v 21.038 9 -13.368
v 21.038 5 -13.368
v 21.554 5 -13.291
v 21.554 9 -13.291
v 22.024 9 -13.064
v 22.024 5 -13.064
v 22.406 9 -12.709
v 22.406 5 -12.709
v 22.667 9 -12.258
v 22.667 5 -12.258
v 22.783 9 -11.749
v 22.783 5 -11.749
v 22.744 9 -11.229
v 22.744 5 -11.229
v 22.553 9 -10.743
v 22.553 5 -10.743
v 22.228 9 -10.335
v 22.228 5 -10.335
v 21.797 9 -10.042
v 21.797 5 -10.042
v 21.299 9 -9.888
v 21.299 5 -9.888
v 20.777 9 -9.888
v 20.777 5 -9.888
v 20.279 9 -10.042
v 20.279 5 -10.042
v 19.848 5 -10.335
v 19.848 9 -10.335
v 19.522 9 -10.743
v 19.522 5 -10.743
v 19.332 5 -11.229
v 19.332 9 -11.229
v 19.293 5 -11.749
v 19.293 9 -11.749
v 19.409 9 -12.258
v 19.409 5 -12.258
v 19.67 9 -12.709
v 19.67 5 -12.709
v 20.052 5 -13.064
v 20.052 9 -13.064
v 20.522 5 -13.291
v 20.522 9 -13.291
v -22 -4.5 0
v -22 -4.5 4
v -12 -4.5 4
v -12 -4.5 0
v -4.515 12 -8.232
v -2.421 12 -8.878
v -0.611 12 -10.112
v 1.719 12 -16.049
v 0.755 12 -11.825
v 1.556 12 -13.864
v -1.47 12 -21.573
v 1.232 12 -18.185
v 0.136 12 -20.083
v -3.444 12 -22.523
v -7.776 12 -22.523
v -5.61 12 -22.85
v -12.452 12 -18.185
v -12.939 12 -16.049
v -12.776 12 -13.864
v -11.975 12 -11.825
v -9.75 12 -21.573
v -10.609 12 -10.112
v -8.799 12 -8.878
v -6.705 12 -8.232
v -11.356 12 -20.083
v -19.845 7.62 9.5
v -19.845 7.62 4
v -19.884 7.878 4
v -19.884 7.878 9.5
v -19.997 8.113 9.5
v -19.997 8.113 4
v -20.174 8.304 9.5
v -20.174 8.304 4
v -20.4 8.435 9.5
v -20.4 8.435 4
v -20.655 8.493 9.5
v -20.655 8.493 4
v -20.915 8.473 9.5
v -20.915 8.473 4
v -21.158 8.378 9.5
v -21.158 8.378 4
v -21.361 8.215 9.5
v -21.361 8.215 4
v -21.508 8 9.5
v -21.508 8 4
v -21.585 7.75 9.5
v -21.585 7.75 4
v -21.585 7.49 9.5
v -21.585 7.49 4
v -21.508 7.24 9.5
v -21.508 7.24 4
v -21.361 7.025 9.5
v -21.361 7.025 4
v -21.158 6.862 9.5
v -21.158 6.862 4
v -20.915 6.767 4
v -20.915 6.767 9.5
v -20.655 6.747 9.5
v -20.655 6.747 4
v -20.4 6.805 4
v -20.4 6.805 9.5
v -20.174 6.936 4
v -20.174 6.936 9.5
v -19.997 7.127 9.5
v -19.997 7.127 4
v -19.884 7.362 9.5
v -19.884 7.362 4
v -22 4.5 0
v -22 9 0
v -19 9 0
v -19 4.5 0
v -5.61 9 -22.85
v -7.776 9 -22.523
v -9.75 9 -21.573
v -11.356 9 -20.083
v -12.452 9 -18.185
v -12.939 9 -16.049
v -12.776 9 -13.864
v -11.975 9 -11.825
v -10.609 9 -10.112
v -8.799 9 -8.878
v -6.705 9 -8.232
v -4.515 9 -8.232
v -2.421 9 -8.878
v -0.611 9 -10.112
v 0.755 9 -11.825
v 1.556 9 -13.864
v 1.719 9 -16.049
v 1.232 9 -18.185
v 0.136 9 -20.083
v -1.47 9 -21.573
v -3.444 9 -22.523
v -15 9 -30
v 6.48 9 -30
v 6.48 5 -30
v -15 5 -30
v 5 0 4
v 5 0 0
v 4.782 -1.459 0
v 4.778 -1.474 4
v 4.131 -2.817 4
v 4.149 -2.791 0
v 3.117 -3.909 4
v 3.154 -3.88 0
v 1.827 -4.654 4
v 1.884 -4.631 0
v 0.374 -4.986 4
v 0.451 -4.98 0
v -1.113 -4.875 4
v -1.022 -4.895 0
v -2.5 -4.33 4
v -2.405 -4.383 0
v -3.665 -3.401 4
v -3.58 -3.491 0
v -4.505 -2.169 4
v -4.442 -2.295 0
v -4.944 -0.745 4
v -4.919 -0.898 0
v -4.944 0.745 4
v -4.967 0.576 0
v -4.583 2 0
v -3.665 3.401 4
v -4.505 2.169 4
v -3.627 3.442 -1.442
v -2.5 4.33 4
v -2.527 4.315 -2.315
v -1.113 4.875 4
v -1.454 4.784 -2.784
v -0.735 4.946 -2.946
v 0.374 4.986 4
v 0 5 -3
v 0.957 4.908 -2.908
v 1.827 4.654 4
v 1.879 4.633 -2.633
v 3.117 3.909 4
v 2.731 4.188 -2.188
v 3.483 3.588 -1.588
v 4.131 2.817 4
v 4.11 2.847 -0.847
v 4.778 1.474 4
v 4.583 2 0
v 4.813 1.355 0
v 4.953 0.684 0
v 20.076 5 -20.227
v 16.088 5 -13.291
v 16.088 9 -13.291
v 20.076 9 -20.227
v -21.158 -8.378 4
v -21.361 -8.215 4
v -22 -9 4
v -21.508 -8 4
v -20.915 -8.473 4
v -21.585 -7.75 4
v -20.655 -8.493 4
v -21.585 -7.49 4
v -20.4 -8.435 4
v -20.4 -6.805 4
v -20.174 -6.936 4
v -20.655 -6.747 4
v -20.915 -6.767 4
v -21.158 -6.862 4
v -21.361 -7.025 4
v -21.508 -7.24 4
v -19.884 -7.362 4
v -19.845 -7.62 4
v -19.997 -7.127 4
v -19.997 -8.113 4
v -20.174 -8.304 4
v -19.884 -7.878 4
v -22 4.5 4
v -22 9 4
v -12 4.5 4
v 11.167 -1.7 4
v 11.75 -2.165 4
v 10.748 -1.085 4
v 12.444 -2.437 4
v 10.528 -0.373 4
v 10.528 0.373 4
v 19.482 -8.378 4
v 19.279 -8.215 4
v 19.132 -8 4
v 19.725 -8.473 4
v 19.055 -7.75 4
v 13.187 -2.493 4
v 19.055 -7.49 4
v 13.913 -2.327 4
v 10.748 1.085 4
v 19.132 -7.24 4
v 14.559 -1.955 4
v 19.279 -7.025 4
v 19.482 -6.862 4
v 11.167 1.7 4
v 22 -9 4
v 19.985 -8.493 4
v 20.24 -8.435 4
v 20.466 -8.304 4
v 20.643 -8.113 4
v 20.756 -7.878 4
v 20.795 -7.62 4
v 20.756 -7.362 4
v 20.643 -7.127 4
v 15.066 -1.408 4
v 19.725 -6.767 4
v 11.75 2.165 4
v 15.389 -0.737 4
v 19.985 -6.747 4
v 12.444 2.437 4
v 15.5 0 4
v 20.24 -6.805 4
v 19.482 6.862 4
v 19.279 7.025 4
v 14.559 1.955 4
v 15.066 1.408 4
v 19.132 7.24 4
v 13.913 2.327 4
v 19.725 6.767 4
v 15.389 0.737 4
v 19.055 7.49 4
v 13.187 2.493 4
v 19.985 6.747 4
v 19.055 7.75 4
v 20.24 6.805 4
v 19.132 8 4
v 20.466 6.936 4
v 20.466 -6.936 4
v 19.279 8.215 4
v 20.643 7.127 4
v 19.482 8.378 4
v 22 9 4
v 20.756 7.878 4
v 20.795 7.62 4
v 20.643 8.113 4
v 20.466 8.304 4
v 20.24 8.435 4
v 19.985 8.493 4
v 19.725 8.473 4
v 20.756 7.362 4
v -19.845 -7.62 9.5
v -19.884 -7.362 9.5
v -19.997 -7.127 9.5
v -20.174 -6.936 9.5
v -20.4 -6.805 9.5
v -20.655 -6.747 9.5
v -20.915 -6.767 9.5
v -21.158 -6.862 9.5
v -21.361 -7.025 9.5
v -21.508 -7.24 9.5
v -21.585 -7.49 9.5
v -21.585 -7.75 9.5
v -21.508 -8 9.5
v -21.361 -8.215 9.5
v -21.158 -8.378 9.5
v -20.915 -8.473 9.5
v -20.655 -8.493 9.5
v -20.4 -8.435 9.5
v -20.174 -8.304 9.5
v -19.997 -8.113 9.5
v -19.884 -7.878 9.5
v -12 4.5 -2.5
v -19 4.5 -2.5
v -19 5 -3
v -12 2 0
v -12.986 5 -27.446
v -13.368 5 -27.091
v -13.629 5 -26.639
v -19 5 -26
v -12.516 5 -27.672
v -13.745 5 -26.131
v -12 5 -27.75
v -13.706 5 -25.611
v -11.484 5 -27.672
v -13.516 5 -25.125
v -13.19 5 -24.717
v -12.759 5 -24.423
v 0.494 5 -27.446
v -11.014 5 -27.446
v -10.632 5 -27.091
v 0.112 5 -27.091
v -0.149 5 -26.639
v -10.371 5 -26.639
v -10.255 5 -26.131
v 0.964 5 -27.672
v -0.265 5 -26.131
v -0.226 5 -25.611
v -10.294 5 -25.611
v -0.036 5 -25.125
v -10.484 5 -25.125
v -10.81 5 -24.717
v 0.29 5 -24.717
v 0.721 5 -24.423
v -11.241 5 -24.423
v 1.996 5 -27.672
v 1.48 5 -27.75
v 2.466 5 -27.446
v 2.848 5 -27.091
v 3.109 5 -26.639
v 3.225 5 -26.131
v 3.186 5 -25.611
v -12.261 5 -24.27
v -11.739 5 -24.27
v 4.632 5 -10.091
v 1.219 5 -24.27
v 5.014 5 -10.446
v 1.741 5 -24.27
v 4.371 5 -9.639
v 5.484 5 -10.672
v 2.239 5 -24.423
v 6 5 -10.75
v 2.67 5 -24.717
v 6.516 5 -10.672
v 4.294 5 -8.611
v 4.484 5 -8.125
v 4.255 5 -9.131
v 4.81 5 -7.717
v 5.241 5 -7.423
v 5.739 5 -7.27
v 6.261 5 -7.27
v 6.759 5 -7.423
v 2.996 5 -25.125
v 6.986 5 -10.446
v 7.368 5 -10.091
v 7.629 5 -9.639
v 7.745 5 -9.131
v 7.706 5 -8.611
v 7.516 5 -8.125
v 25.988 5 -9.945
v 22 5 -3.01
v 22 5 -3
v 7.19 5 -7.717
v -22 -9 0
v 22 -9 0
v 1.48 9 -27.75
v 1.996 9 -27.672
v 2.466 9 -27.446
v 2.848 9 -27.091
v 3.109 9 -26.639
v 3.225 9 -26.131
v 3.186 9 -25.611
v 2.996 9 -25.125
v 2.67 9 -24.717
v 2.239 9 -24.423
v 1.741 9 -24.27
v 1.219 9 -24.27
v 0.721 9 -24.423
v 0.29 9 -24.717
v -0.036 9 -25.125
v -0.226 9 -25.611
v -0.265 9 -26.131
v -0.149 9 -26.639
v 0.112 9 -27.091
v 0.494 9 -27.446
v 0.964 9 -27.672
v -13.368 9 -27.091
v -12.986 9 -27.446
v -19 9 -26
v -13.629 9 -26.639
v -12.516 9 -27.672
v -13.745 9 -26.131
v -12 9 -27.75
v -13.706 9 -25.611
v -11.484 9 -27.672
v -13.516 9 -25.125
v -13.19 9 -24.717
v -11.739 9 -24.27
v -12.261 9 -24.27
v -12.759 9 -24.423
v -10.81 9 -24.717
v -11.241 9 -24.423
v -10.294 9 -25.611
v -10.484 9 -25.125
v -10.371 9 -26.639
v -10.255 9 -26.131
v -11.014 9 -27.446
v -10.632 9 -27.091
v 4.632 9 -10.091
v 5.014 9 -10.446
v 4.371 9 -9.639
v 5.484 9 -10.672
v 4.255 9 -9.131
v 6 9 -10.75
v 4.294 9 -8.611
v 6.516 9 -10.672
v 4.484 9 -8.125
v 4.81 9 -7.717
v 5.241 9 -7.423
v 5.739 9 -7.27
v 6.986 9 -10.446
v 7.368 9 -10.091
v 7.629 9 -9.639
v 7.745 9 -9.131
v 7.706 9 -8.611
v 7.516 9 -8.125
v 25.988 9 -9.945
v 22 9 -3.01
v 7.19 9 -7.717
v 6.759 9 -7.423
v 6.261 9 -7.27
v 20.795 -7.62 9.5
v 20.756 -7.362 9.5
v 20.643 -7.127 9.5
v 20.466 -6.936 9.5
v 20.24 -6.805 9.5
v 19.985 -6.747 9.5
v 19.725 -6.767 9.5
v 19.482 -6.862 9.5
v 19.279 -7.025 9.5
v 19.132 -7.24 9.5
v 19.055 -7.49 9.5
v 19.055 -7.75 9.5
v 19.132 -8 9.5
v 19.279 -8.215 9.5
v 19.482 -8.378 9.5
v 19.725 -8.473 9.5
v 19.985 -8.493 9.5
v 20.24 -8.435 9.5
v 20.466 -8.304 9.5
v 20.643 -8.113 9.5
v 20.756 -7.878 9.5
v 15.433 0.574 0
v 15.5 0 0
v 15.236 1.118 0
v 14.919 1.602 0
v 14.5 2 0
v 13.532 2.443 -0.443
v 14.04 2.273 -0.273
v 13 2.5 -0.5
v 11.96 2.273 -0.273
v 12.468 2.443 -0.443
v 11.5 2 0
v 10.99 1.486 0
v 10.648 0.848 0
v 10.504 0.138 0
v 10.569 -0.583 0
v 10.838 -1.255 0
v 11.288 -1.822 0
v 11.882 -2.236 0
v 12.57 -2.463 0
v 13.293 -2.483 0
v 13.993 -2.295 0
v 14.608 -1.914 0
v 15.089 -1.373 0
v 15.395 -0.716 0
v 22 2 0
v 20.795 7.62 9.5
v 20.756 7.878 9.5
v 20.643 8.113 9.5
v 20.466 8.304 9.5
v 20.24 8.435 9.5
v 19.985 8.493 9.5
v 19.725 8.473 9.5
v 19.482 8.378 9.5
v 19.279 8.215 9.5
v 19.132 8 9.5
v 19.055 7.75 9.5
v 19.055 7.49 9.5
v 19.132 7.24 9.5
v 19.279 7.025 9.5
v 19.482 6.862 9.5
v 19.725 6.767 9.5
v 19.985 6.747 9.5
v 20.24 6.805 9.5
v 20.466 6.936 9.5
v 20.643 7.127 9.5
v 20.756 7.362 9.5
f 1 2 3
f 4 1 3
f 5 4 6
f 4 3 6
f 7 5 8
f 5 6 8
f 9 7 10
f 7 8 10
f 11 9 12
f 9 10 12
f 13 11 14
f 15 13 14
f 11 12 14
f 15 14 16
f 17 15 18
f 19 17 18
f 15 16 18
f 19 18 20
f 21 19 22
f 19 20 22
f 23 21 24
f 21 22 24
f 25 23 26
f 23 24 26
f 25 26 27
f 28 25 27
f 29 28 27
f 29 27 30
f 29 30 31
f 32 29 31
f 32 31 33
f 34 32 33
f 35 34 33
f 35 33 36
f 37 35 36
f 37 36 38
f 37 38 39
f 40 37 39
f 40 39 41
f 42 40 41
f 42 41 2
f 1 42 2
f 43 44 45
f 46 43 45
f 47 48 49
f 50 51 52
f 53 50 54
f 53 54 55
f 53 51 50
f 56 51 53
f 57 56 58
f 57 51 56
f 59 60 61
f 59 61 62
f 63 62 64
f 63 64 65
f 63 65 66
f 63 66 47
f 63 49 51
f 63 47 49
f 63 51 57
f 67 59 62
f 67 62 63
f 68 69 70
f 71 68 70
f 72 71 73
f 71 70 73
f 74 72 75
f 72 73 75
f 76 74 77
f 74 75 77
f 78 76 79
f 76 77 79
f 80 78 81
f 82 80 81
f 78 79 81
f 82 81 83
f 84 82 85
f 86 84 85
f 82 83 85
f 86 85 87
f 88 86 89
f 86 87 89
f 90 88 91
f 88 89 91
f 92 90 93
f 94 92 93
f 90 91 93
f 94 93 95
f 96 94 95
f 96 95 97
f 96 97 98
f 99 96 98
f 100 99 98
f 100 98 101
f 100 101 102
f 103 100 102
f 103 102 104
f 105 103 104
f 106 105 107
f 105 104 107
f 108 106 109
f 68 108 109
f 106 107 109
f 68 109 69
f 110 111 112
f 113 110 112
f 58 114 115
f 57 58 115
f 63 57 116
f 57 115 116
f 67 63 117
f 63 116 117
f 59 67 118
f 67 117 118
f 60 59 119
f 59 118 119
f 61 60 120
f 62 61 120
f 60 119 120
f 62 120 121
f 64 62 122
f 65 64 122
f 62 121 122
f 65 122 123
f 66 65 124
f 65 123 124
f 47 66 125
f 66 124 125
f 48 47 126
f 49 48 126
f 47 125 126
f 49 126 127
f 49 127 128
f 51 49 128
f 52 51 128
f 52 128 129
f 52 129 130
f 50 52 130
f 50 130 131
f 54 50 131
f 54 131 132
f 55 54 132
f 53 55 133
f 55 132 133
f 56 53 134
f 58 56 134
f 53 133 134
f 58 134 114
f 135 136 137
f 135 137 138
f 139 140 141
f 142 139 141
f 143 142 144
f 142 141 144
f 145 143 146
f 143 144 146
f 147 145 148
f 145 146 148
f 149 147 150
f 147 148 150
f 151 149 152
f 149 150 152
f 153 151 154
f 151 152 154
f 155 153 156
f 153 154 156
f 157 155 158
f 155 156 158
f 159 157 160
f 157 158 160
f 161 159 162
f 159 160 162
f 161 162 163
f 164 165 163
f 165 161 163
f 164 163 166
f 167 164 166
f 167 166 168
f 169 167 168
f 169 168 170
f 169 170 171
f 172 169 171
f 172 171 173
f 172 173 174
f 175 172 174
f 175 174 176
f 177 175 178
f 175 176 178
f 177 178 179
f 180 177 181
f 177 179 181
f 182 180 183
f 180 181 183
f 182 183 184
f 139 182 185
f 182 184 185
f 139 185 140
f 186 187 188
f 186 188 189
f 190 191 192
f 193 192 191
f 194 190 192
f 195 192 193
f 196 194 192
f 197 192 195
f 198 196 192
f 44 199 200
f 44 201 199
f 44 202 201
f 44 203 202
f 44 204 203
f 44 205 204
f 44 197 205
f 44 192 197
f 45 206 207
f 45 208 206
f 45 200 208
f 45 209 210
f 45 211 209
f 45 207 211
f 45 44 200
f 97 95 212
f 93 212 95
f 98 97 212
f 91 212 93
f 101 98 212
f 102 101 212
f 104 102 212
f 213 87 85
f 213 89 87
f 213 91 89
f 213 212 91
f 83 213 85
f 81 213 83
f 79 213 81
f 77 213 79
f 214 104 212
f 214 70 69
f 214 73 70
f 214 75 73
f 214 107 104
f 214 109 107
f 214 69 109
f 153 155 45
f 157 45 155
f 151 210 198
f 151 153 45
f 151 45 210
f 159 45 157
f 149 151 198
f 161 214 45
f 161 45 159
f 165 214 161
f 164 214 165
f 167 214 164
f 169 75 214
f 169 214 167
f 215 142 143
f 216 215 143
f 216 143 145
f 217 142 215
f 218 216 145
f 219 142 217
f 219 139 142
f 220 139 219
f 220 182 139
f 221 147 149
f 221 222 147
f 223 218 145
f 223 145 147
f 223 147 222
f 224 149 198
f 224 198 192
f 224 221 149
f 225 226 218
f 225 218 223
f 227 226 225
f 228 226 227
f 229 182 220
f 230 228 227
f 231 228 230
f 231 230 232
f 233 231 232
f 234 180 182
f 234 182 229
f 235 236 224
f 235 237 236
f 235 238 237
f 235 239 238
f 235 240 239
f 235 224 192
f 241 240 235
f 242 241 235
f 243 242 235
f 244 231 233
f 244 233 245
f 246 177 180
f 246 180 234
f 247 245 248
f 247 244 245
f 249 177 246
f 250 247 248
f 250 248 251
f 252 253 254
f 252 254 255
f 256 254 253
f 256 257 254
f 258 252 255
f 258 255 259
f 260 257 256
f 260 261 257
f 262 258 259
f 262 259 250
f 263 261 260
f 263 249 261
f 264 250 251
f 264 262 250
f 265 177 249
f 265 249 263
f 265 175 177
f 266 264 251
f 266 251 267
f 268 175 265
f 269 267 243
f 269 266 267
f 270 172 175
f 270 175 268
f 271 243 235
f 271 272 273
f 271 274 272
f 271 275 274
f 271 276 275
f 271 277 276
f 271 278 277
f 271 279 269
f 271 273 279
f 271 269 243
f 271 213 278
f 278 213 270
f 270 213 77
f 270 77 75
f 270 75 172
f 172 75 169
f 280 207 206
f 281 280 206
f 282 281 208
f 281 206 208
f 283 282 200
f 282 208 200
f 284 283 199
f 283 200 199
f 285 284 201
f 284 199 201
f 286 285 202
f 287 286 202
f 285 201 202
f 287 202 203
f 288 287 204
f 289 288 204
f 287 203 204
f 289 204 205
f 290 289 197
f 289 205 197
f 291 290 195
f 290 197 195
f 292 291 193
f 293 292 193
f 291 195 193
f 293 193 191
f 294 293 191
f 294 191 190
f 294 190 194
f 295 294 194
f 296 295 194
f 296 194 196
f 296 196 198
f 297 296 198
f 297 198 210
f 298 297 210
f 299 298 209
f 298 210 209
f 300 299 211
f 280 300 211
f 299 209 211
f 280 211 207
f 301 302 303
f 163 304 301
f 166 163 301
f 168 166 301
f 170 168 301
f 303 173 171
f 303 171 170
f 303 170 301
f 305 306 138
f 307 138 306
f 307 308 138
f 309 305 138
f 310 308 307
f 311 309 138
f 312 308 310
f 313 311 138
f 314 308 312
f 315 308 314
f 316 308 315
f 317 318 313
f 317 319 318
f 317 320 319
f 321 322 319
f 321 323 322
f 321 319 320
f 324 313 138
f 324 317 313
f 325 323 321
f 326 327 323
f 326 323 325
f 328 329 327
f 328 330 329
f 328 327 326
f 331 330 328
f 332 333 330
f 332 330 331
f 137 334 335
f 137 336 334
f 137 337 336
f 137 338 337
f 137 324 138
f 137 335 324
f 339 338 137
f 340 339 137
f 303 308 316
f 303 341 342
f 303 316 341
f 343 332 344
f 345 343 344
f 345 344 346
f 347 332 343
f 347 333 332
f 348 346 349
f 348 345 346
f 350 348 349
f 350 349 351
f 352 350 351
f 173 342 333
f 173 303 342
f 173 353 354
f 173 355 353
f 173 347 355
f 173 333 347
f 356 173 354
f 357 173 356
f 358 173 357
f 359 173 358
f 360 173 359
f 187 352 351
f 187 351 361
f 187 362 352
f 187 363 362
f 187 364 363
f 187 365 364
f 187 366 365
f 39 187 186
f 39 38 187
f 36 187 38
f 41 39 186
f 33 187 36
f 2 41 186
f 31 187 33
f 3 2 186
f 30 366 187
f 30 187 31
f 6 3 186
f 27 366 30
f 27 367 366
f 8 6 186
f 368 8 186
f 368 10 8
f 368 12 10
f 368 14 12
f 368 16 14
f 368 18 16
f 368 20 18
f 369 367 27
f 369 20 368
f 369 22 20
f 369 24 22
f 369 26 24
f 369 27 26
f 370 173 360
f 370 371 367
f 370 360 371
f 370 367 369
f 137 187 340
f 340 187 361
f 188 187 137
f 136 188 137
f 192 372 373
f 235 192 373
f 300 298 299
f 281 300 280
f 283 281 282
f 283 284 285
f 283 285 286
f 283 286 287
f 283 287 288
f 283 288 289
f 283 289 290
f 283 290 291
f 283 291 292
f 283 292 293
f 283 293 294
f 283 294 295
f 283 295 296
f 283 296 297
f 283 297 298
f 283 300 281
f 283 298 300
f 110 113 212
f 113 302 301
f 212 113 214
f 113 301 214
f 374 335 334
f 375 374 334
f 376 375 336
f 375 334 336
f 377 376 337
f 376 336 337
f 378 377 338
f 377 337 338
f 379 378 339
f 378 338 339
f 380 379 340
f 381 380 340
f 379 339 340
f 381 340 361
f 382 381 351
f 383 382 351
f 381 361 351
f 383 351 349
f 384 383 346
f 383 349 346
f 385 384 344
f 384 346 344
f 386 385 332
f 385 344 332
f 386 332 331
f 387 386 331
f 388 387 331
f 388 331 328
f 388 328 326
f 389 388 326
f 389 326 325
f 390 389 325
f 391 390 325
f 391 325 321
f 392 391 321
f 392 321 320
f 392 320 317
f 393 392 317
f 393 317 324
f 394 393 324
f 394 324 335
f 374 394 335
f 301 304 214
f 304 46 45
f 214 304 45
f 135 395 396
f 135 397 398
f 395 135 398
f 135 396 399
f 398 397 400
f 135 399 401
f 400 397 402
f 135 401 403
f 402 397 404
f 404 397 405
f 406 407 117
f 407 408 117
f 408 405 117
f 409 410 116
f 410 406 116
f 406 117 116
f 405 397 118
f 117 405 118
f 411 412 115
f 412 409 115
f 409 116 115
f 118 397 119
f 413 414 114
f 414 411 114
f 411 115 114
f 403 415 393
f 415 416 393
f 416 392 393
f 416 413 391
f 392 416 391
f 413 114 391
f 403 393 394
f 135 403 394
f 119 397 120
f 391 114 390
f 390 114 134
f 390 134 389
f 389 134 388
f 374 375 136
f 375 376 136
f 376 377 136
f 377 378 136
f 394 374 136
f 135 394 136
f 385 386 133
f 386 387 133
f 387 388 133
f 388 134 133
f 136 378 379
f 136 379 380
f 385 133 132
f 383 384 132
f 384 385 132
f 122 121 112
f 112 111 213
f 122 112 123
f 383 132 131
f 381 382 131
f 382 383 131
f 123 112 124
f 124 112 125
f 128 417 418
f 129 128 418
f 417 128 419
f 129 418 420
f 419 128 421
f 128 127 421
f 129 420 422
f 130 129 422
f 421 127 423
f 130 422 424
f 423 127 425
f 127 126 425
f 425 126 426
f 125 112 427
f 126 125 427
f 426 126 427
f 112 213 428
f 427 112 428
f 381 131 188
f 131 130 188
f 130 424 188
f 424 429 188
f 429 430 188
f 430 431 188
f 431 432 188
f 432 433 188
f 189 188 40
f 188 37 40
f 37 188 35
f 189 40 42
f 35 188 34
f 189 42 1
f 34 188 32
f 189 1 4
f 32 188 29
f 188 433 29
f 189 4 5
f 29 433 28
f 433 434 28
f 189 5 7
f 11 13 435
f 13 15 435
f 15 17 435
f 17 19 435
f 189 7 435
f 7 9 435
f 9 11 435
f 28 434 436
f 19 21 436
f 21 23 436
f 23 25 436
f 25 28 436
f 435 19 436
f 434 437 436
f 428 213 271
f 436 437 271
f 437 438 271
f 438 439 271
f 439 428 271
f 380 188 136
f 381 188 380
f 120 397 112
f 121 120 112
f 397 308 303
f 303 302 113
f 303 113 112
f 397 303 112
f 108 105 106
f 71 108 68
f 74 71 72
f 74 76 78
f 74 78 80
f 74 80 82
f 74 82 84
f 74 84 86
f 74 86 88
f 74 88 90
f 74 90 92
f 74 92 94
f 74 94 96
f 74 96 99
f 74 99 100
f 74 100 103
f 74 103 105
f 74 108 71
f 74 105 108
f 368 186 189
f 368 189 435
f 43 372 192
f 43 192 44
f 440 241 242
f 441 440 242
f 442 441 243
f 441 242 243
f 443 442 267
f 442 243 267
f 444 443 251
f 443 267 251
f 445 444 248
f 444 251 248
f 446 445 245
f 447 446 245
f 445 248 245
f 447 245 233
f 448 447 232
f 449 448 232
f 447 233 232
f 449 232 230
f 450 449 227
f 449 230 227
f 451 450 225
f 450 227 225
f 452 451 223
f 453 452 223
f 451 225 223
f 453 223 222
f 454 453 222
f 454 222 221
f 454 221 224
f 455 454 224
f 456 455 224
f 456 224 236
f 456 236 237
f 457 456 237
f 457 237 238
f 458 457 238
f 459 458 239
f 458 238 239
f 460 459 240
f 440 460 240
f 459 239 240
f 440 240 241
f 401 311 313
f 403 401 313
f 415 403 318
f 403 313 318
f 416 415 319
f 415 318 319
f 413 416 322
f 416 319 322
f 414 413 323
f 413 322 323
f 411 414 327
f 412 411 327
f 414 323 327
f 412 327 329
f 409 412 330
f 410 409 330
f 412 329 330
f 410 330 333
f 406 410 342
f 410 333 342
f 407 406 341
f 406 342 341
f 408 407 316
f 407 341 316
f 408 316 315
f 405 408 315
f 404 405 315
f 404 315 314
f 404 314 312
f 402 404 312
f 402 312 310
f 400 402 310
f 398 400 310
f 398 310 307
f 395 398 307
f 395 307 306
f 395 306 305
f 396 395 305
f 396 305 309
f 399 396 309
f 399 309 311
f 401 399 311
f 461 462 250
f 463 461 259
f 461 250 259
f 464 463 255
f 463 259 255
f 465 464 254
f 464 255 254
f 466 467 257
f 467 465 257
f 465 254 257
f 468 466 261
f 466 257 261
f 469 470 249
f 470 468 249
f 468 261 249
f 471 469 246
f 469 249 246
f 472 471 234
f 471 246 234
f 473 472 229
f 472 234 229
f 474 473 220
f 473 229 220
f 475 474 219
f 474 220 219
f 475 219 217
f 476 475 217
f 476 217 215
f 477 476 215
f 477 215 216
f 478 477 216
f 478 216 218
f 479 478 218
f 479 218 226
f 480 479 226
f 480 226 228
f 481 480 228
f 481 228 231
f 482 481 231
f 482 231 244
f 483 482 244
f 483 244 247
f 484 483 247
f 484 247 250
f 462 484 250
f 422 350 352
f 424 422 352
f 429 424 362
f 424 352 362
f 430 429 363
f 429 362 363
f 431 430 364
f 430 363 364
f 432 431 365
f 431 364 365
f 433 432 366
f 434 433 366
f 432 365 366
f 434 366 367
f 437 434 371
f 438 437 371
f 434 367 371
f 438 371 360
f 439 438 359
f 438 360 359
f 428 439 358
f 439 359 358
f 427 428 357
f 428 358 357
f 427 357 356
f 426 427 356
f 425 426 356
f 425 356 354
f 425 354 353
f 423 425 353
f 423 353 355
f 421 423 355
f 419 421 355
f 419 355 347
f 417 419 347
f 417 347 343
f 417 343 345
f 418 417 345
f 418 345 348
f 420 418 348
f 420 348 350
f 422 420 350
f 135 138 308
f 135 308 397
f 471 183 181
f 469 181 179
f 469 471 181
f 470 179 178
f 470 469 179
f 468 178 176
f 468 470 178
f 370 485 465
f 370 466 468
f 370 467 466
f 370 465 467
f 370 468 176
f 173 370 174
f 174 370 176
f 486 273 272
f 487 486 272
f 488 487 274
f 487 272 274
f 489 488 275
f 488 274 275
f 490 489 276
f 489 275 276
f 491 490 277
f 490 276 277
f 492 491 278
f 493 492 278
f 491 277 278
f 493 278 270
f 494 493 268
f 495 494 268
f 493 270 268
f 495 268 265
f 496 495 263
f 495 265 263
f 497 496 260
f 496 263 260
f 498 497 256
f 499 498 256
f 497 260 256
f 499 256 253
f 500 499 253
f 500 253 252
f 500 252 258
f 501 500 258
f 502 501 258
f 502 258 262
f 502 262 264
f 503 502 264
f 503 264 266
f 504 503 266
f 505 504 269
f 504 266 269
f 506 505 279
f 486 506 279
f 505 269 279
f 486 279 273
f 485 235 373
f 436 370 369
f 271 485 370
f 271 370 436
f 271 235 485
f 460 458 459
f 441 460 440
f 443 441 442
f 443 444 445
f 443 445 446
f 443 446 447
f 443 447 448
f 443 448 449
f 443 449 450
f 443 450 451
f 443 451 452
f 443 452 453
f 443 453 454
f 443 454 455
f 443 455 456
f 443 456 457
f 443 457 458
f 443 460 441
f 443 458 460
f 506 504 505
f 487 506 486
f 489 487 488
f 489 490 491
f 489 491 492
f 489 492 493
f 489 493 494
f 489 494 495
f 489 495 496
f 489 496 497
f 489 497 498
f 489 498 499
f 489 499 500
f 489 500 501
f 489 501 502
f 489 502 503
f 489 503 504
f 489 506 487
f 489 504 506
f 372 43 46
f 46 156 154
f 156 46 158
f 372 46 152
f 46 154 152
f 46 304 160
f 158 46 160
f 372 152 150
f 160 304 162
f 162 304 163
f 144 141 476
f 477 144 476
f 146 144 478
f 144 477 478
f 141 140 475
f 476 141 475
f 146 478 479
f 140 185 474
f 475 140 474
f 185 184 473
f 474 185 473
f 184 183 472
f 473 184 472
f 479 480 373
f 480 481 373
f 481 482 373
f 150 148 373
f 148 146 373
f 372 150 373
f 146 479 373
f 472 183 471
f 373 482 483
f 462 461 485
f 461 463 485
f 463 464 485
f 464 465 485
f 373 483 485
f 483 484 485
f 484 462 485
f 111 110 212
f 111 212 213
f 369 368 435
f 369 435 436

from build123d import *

# Parameters (mm, degrees)
SKETCH_1_W          = 44
SKETCH_1_H          = 18
SKETCH_1_R          = 5
EXTRUDE_1_DEPTH     = 4
SKETCH_2_W          = 10
SKETCH_2_H          = 9
CUT_EXTRUDE_1_DEPTH = 25.103941586
SKETCH_3_R          = 0.875
EXTRUDE_2_DEPTH     = 5.5
SKETCH_4_W          = 41
SKETCH_4_H          = 4
EXTRUDE_3_DEPTH     = 30
SKETCH_5_R          = 7.35
EXTRUDE_4_DEPTH     = 3
CUT_EXTRUDE_2_DEPTH = 40.749213829
EXTRUDE_6_DEPTH     = 4
SKETCH_8_R          = 1.75
CUT_EXTRUDE_3_DEPTH = 43.087666423
CHAMFER_1_SIZE      = 3
SKETCH_9_R          = 2.5
CUT_EXTRUDE_5_DEPTH = 45.445153447
CHAMFER_2_SIZE      = 4


with BuildPart() as part:
    # Эскиз1 → Бобышка-Вытянуть1 (new body)
    with BuildSketch(Plane.XY):
        Rectangle(SKETCH_1_W, SKETCH_1_H)
        Circle(SKETCH_1_R, mode=Mode.SUBTRACT)
    extrude(amount=EXTRUDE_1_DEPTH)

    # Эскиз2 → Вырез-Вытянуть1 (cut, through all)
    with BuildSketch(Plane.XY.offset(4)):
        with Locations((-17, 0)):
            Rectangle(SKETCH_2_W, SKETCH_2_H)
    extrude(amount=-CUT_EXTRUDE_1_DEPTH, mode=Mode.SUBTRACT)

    # Эскиз3 → Бобышка-Вытянуть2 (add)
    with BuildSketch(Plane.XY.offset(4)):
        with Locations((-20.72, 7.62)):
            Circle(SKETCH_3_R)
        with Locations((-20.72, -7.62)):
            Circle(SKETCH_3_R)
        with Locations((19.92, -7.62)):
            Circle(SKETCH_3_R)
        with Locations((19.92, 7.62)):
            Circle(SKETCH_3_R)
    extrude(amount=EXTRUDE_2_DEPTH)

    # Эскиз4 → Бобышка-Вытянуть3 (add)
    with BuildSketch(Plane(origin=(0, 0, 0), x_dir=(-1, 0, 0), z_dir=(0, 0, -1))):
        with Locations((-1.5, 7)):
            Rectangle(SKETCH_4_W, SKETCH_4_H)
    extrude(amount=EXTRUDE_3_DEPTH)

    # Эскиз5 → Бобышка-Вытянуть4 (add)
    with BuildSketch(Plane(origin=(0, 9, 0), x_dir=(1, 0, 0), z_dir=(0, 1, 0))):
        with Locations(Location((-5.61, 15.5, 0), (0, 0, 90))):
            Circle(SKETCH_5_R)
    extrude(amount=EXTRUDE_4_DEPTH)

    # Эскиз6 → Вырез-Вытянуть2 (cut, through all)
    with BuildSketch(Plane.XZ.offset(-5)):
        Polygon((22, -3.01), (6.48, -30), (22, -30), align=None)
    extrude(amount=-CUT_EXTRUDE_2_DEPTH, mode=Mode.SUBTRACT)

    # Эскиз7 → Бобышка-Вытянуть6 (add)
    with BuildSketch(Plane.XZ.offset(-5)):
        Polygon((25.987913824, -9.945167145), (22, -3.01), (16.087917757, -13.291385293), (20.07583158, -20.226552439), align=None)
    extrude(amount=-EXTRUDE_6_DEPTH)

    # Эскиз8 → Вырез-Вытянуть3 (cut, through all)
    with BuildSketch(Plane.XZ.offset(-5)):
        with Locations(Location((21.03791579, -11.618276219, 0), (0, 0, 270))):
            Circle(SKETCH_8_R)
        with Locations(Location((-12, -26, 0), (0, 0, 270))):
            Circle(SKETCH_8_R)
        with Locations(Location((1.48, -26, 0), (0, 0, 270))):
            Circle(SKETCH_8_R)
        with Locations(Location((6, -9, 0), (0, 0, 270))):
            Circle(SKETCH_8_R)
    extrude(amount=-CUT_EXTRUDE_3_DEPTH, mode=Mode.SUBTRACT)

    # Фаска1
    # the kernel refuses this chamfer: 3 mm, written as the material it adds along each edge
    with BuildSketch(Plane(origin=(2.6e-08, 5, 0), x_dir=(0, -0.9996219169112968, 0.027495876610586372), z_dir=(-1, 0, 0))) as chamfer_1_piece_1_section:
        Polygon((CHAMFER_1_SIZE * 0.999621916911, -CHAMFER_1_SIZE * 0.0274958766106), (-CHAMFER_1_SIZE * 0.0274958766106, -CHAMFER_1_SIZE * 0.999621916911), (0, 0), align=None)
    chamfer_1_piece_1 = extrude(amount=26.71504899, mode=Mode.PRIVATE)
    chamfer_1_piece_1 = split(chamfer_1_piece_1, bisect_by=Plane(origin=(-12, 3.70825936, -0.85412968), z_dir=(1, 0, 0)), keep=Keep.TOP, mode=Mode.PRIVATE)
    chamfer_1_piece_1 = chamfer_1_piece_1 - Plane(origin=(0, 0, -0.85412968), x_dir=(1, 0, 0), z_dir=(0, 0, -1)) * Cylinder(5, 66, mode=Mode.PRIVATE)
    add(chamfer_1_piece_1)
    with BuildSketch(Plane(origin=(2.6e-08, 5, 0), x_dir=(0, -0.9996219169112968, 0.027495876610586372), z_dir=(-1, 0, 0))) as chamfer_1_piece_2_section:
        Polygon((CHAMFER_1_SIZE * 0.999621916911, -CHAMFER_1_SIZE * 0.0274958766106), (-CHAMFER_1_SIZE * 0.0274958766106, -CHAMFER_1_SIZE * 0.999621916911), (0, 0), align=None)
    chamfer_1_piece_2 = extrude(amount=19.000000026, mode=Mode.PRIVATE)
    chamfer_1_piece_2 = split(chamfer_1_piece_2, bisect_by=Plane(origin=(-15.5, 4.5, -1.378787879), z_dir=(0, 1, 0)), keep=Keep.TOP, mode=Mode.PRIVATE)
    chamfer_1_piece_2 = split(chamfer_1_piece_2, bisect_by=Plane(origin=(-12, 4.757575758, -1.378787879), z_dir=(-1, 0, 0)), keep=Keep.TOP, mode=Mode.PRIVATE)
    add(chamfer_1_piece_2)
    with BuildSketch(Plane(origin=(22, 5, 0), x_dir=(0, -0.9996219169112968, 0.027495876610586372), z_dir=(-1, 0, 0))) as chamfer_1_piece_3_section:
        Polygon((CHAMFER_1_SIZE * 0.999621916911, -CHAMFER_1_SIZE * 0.0274958766106), (-CHAMFER_1_SIZE * 0.0274958766106, -CHAMFER_1_SIZE * 0.999621916911), (0, 0), align=None)
    chamfer_1_piece_3 = extrude(amount=21.999999974, mode=Mode.PRIVATE)
    chamfer_1_piece_3 = chamfer_1_piece_3 - Plane(origin=(0, 0, -1.018193592), x_dir=(1, 0, 0), z_dir=(0, 0, -1)) * Cylinder(5, 56, mode=Mode.PRIVATE)
    add(chamfer_1_piece_3)

    # Эскиз9 → Вырез-Вытянуть5 (cut, through all)
    with BuildSketch(Plane.XY.offset(4)):
        with Locations((13, 0)):
            Circle(SKETCH_9_R)
    extrude(amount=-CUT_EXTRUDE_5_DEPTH, mode=Mode.SUBTRACT)

    # Фаска2
    chamfer_2_edges = [part.edges().sort_by_distance(p)[0] for p in [
        (-19, 7, -30),
    ]]
    chamfer(chamfer_2_edges, length=CHAMFER_2_SIZE)


solid = part.part
